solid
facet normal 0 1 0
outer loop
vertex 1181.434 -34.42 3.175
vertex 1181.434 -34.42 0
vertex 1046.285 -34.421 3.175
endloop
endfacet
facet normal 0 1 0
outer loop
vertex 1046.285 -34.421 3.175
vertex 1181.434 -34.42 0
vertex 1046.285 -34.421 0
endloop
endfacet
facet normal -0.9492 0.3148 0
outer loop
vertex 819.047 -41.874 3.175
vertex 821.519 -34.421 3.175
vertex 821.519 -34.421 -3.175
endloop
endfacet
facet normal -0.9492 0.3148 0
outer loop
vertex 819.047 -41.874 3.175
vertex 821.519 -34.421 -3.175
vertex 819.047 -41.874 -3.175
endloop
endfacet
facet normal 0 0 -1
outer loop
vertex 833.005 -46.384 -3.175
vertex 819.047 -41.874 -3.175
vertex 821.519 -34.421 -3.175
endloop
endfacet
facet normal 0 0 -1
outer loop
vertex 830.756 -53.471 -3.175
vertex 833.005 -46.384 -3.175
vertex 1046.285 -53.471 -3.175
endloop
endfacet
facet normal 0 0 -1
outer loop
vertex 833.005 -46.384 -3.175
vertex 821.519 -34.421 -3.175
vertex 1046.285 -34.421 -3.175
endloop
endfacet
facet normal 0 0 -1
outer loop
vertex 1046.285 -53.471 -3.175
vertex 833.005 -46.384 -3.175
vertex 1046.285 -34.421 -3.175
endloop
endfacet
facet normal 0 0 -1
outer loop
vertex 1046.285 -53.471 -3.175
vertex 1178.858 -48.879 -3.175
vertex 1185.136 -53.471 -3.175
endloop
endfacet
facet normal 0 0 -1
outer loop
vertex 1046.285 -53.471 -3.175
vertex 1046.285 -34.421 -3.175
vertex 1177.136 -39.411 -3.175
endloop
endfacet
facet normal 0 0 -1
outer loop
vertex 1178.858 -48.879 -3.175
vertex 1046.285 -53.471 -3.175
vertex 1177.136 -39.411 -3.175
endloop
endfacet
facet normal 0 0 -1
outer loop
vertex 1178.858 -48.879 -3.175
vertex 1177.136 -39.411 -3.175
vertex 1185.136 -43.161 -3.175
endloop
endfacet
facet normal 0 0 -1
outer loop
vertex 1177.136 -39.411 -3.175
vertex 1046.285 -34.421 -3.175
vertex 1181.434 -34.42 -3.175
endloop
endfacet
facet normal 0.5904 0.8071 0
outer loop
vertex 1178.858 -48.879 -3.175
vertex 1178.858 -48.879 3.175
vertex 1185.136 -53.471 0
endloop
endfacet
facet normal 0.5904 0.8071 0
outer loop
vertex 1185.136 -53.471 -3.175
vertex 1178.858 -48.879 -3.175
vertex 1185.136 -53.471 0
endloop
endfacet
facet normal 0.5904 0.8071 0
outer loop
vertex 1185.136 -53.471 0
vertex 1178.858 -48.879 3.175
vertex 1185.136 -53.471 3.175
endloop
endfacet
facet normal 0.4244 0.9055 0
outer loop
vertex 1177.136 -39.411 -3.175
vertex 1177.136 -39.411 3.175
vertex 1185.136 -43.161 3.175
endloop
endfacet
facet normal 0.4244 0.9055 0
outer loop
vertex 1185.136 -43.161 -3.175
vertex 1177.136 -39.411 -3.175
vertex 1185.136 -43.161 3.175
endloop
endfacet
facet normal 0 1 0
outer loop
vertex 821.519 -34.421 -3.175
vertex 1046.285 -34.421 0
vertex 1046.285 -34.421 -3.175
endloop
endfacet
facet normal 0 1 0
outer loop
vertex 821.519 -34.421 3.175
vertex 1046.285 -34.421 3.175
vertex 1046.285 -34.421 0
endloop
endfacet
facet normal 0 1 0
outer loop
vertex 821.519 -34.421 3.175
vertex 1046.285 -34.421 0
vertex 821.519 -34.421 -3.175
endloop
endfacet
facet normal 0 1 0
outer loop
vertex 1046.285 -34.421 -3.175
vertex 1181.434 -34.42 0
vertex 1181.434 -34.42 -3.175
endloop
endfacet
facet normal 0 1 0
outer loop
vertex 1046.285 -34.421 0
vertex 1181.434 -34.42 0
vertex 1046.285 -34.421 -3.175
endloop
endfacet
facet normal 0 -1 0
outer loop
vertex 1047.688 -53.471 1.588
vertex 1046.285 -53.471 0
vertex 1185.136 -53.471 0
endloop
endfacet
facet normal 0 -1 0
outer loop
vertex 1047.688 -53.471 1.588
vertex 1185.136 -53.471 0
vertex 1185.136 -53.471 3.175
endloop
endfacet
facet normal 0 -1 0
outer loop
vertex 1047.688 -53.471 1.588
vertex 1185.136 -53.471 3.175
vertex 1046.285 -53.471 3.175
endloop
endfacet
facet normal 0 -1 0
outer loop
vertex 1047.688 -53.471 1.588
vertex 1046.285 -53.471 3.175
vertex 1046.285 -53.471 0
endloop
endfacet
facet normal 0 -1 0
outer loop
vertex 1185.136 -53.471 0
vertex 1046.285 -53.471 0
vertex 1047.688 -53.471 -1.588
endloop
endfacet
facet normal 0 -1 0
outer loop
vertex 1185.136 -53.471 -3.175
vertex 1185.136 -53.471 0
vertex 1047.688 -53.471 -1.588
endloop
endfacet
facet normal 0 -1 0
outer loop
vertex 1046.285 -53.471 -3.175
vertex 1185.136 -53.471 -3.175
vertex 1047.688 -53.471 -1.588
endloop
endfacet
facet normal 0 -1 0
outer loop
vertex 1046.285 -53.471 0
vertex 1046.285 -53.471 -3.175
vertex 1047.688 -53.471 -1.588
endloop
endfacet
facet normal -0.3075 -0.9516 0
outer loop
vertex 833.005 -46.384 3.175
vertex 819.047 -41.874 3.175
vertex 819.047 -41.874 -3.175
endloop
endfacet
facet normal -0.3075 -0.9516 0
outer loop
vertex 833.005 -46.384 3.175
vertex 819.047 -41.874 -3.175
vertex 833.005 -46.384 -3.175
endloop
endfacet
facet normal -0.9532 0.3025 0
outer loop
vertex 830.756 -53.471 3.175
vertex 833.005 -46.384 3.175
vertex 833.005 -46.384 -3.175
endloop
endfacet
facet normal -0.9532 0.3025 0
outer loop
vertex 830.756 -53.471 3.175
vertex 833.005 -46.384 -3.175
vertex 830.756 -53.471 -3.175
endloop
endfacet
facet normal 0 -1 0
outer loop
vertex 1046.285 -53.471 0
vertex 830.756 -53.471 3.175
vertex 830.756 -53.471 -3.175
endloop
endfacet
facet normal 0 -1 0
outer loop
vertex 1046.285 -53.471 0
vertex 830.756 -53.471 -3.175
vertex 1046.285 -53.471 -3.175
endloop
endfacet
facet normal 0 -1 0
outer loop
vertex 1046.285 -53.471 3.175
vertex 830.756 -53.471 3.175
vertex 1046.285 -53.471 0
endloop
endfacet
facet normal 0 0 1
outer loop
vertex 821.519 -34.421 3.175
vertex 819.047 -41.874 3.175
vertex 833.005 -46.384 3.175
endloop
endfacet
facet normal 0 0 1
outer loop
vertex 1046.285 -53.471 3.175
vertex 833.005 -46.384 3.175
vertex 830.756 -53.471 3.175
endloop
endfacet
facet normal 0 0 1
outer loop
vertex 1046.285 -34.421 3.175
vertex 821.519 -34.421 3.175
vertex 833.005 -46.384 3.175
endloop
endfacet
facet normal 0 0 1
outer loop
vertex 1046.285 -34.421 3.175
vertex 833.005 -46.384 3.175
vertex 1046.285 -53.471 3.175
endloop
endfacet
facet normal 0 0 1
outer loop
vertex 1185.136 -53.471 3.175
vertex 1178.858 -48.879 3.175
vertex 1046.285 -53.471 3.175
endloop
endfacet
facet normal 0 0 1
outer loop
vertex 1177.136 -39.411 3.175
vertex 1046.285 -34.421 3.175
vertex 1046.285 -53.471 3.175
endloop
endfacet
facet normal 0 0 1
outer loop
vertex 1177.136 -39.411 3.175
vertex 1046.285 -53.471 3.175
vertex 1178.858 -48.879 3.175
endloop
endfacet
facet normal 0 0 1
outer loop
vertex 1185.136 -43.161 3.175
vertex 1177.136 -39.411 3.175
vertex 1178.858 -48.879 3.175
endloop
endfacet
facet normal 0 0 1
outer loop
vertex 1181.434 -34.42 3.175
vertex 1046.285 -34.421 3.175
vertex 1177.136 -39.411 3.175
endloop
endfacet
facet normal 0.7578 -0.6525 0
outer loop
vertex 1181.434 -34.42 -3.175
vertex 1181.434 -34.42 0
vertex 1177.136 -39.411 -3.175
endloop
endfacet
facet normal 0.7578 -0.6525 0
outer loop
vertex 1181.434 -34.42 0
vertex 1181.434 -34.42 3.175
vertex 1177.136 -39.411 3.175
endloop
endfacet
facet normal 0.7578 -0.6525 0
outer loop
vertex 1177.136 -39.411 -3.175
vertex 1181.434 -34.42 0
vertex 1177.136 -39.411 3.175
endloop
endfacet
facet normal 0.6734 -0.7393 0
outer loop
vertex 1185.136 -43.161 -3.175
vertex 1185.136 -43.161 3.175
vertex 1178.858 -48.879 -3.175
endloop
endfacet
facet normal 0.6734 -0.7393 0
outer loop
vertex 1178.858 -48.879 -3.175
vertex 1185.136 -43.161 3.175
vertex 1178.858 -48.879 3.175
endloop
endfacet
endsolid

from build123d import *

# Parameters (mm, degrees)
BOSS_EXTRUDE1_DEPTH = 3.175
CUT_EXTRUDE1_DEPTH  = 7.3500001
FILLET1_R           = 2.54
CUT_EXTRUDE2_DEPTH  = 7.62


with BuildPart() as part:
    # Sketch1 → Boss-Extrude1 (new body, symmetric)
    with BuildSketch(Plane.XY):
        with BuildLine():
            Line((499.61002795, -53.470702797), (1046.28548189, -53.470702797))
            add(Edge.make_bspline(
                [(2669.54, -9.569049356), (2615.393603553, -13.17073937), (2561.080658619, -16.536108081), (2506.205230446, -19.758621957), (2430.209106802, -23.505211705), (2354.212983157, -26.631486423), (2332.570330468, -27.480988169), (2156.268639429, -34.377768543), (1979.966947376, -41.628631248), (1824.114277635, -52.771265877), (1636.928606778, -53.579569849), (1449.742935921, -53.454024613), (1418.006730935, -53.470702797), (1324.899336146, -53.470702797), (1231.791940344, -53.470702797), (1170.441269319, -53.470702797), (1108.784075813, -53.470702797), (1047.126882346, -53.470702797), (1046.846414188, -53.470702797), (1046.565947184, -53.470702797), (1046.28548189, -53.470702797)],
                knots=[103.698913506, 103.698913506, 103.698913506, 103.698913506, 103.698913506, 103.698913506, 130.927896619, 130.927896619, 130.927896619, 141.337054719, 141.337054719, 141.337054719, 218.101815019, 218.101815019, 218.101815019, 233.772059419, 233.772059419, 233.772059419, 264.077723219, 264.077723219, 264.077723219, 264.2162088, 264.2162088, 264.2162088, 264.2162088, 264.2162088, 264.2162088], degree=5))
            Line((2669.54, -9.569049356), (2669.54, 9.5231025))
            add(Edge.make_bspline(
                [(2669.54, 9.5231025), (2667.126494524, 9.36235515), (2659.861586685, 8.880281494), (2635.666282302, 7.292469146), (2596.857665529, 4.826056853), (2545.729743039, 1.758344093), (2494.405305707, -1.098555235), (2451.533022267, -3.266573297), (2417.198316756, -4.86708361), (2391.457076919, -6.003589235), (2365.634736307, -7.086854581), (2339.546284672, -8.137729944), (2313.466132974, -9.165138371), (2287.612375486, -10.179478215), (2261.763347437, -11.201032297), (2227.285329715, -12.583842557), (2184.175569393, -14.36607236), (2132.429066114, -16.607427868), (2063.4255234, -19.708920485), (1977.174907635, -23.700543313), (1873.732451432, -28.149389221), (1770.37461881, -31.657468649), (1667.085687813, -33.793117556), (1581.011094491, -34.383188831), (1512.07397126, -34.4278026), (1443.061513477, -34.409510402), (1356.800927879, -34.424432812), (1218.794626954, -34.418464788), (1115.289022786, -34.420702797), (1046.28548189, -34.420702797)],
                knots=[103.571582669, 103.571582669, 103.571582669, 103.571582669, 104.300777207, 105.766098403, 110.877392287, 115.98868617, 121.099980054, 126.211273938, 128.76692088, 131.322567822, 133.878214764, 136.433861706, 138.989508647, 141.545155589, 144.100802531, 146.656449473, 151.767743357, 156.879037241, 161.990331124, 172.212918892, 182.43550666, 192.658094427, 202.880682195, 213.103269962, 218.214563846, 223.32585773, 233.548445497, 243.771033265, 264.2162088, 264.2162088, 264.2162088, 264.2162088], degree=3))
            Line((1046.28548189, -34.420702797), (499.61002795, -34.420702797))
            add(Edge.make_bspline(
                [(499.61002795, -34.420702797), (488.614737518, -34.420702797), (472.236395365, -34.420702798), (449.940231846, -34.420702794), (427.771305695, -34.42070281), (405.874681663, -34.420702712), (384.584909128, -34.420702942), (368.900229326, -34.420702244), (353.376568613, -34.420704862), (332.608466435, -34.420689186), (306.287754853, -34.420570006), (274.023487704, -34.420538256), (252.271015965, -34.420709741), (241.425150134, -34.420702761)],
                knots=[19.90682951, 19.90682951, 19.90682951, 19.90682951, 23.220120017, 24.876765271, 26.533410525, 29.846701033, 31.503346286, 33.15999154, 34.816636794, 36.473282048, 39.786572556, 43.099863063, 46.413153571, 46.413153571, 46.413153571, 46.413153571], degree=3))
            add(Edge.make_bspline(
                [(241.425150134, -34.420702761), (239.394928853, -34.420701455), (235.322322927, -34.420495867), (227.274423443, -34.398702533), (217.319360062, -34.297466855), (205.530690077, -33.976385563), (189.963341914, -33.212641271), (170.696984653, -31.543495194), (147.533261232, -28.314398128), (125.482753206, -24.202109872), (109.358914834, -20.622537553), (100.964116069, -18.612521054), (99.06, -18.149327722)],
                knots=[0, 0, 0, 0, 0.622088422, 1.244176844, 2.488353689, 3.732530533, 4.976707377, 7.465061066, 9.953414755, 12.441768444, 14.55823542, 15.180323842, 15.180323842, 15.180323842, 15.180323842], degree=3))
            Line((99.06, -18.149327722), (99.06, -37.741485304))
            add(Edge.make_bspline(
                [(241.425137875, -53.470702761), (224.286916993, -53.470691732), (207.149474967, -53.467315374), (190.203897513, -52.686577078), (161.734965878, -49.987457476), (133.266034188, -45.175583375), (121.749620566, -42.910592695), (110.349390726, -40.420274627), (99.06, -37.741485304)],
                knots=[0, 0, 0, 0, 0, 0, 8.71381608, 8.71381608, 8.71381608, 14.701907176, 14.701907176, 14.701907176, 14.701907176, 14.701907176, 14.701907176], degree=5))
            add(Edge.make_bspline(
                [(499.61002795, -53.470702797), (492.136820835, -53.470702797), (484.754348064, -53.470702797), (477.443025859, -53.470702797), (448.516583145, -53.470702797), (419.590140517, -53.470702797), (398.368118521, -53.470702797), (355.647540186, -53.470702797), (312.926961851, -53.470702797), (289.235090436, -53.470293029), (265.364963651, -53.470705034), (241.4948369, -53.470702789), (241.471603891, -53.470702785), (241.448370882, -53.470702776), (241.425137875, -53.470702761)],
                knots=[19.90682951, 19.90682951, 19.90682951, 19.90682951, 19.90682951, 19.90682951, 23.637897311, 23.637897311, 23.637897311, 34.276545571, 34.276545571, 34.276545571, 46.401340901, 46.401340901, 46.401340901, 46.413153571, 46.413153571, 46.413153571, 46.413153571, 46.413153571, 46.413153571], degree=5))
        make_face()
    extrude(amount=BOSS_EXTRUDE1_DEPTH, both=True)

    # Sketch2 → Cut-Extrude1 (cut, through all)
    with BuildSketch(Plane.XY.offset(3.175)):
        with BuildLine():
            add(Edge.make_bspline(
                [(2312.9875, -9.183260037), (2304.505441691, -9.516700376), (2287.441020622, -10.186250162), (2261.763347437, -11.201032297), (2228.230552004, -12.545932515), (2203.310445107, -13.575047161), (2187.00995947, -14.263260037)],
                knots=[139.04033329, 139.04033329, 139.04033329, 139.04033329, 141.545155589, 144.100802531, 146.656449473, 151.487488909, 151.487488909, 151.487488909, 151.487488909], degree=3))
            Line((2187.00995947, -14.263260037), (2312.9875, -14.263260037))
            Line((2312.9875, -14.263260037), (2312.9875, -9.183260037))
        make_face()
    extrude(amount=-CUT_EXTRUDE1_DEPTH, mode=Mode.SUBTRACT)

    # Fillet1
    fillet1_edges = [part.edges().sort_by_distance(p)[0] for p in [
        (2669.54, -9.569049356, -1.5875),
        (2669.54, 9.5231025, -1.5875),
        (99.06, -37.741485304, -1.5875),
        (99.06, -18.149327722, -1.5875),
        (2312.9875, -9.183260037, 1.5875),
        (2312.9875, -14.263260037, 0),
    ]]
    fillet(fillet1_edges, radius=FILLET1_R)

    # Sketch3 → Cut-Extrude2 (cut)
    with BuildSketch(Plane.XY.offset(3.175)):
        Polygon((821.518882755, -34.420702797), (819.047328197, -41.874419167), (833.004793216, -46.384200616), (830.756310042, -53.470702797), (833.004793216, -88.377214401), (71.333278148, -146.659078969), (65.822633249, 75.523734032), (821.518882755, 94.266739515), align=None)
        Polygon((1181.433983433, -34.420040525), (1177.136382458, -39.41105826), (1185.135968065, -43.161373269), (1178.857838528, -48.879066642), (1185.135968065, -53.470702797), (1178.857838528, -73.832795228), (2840.460279362, -301.9320282), (2840.460279362, 201.131978716), (1181.433983433, 94.266739515), align=None)
    extrude(amount=-CUT_EXTRUDE2_DEPTH, mode=Mode.SUBTRACT)


solid = part.part
